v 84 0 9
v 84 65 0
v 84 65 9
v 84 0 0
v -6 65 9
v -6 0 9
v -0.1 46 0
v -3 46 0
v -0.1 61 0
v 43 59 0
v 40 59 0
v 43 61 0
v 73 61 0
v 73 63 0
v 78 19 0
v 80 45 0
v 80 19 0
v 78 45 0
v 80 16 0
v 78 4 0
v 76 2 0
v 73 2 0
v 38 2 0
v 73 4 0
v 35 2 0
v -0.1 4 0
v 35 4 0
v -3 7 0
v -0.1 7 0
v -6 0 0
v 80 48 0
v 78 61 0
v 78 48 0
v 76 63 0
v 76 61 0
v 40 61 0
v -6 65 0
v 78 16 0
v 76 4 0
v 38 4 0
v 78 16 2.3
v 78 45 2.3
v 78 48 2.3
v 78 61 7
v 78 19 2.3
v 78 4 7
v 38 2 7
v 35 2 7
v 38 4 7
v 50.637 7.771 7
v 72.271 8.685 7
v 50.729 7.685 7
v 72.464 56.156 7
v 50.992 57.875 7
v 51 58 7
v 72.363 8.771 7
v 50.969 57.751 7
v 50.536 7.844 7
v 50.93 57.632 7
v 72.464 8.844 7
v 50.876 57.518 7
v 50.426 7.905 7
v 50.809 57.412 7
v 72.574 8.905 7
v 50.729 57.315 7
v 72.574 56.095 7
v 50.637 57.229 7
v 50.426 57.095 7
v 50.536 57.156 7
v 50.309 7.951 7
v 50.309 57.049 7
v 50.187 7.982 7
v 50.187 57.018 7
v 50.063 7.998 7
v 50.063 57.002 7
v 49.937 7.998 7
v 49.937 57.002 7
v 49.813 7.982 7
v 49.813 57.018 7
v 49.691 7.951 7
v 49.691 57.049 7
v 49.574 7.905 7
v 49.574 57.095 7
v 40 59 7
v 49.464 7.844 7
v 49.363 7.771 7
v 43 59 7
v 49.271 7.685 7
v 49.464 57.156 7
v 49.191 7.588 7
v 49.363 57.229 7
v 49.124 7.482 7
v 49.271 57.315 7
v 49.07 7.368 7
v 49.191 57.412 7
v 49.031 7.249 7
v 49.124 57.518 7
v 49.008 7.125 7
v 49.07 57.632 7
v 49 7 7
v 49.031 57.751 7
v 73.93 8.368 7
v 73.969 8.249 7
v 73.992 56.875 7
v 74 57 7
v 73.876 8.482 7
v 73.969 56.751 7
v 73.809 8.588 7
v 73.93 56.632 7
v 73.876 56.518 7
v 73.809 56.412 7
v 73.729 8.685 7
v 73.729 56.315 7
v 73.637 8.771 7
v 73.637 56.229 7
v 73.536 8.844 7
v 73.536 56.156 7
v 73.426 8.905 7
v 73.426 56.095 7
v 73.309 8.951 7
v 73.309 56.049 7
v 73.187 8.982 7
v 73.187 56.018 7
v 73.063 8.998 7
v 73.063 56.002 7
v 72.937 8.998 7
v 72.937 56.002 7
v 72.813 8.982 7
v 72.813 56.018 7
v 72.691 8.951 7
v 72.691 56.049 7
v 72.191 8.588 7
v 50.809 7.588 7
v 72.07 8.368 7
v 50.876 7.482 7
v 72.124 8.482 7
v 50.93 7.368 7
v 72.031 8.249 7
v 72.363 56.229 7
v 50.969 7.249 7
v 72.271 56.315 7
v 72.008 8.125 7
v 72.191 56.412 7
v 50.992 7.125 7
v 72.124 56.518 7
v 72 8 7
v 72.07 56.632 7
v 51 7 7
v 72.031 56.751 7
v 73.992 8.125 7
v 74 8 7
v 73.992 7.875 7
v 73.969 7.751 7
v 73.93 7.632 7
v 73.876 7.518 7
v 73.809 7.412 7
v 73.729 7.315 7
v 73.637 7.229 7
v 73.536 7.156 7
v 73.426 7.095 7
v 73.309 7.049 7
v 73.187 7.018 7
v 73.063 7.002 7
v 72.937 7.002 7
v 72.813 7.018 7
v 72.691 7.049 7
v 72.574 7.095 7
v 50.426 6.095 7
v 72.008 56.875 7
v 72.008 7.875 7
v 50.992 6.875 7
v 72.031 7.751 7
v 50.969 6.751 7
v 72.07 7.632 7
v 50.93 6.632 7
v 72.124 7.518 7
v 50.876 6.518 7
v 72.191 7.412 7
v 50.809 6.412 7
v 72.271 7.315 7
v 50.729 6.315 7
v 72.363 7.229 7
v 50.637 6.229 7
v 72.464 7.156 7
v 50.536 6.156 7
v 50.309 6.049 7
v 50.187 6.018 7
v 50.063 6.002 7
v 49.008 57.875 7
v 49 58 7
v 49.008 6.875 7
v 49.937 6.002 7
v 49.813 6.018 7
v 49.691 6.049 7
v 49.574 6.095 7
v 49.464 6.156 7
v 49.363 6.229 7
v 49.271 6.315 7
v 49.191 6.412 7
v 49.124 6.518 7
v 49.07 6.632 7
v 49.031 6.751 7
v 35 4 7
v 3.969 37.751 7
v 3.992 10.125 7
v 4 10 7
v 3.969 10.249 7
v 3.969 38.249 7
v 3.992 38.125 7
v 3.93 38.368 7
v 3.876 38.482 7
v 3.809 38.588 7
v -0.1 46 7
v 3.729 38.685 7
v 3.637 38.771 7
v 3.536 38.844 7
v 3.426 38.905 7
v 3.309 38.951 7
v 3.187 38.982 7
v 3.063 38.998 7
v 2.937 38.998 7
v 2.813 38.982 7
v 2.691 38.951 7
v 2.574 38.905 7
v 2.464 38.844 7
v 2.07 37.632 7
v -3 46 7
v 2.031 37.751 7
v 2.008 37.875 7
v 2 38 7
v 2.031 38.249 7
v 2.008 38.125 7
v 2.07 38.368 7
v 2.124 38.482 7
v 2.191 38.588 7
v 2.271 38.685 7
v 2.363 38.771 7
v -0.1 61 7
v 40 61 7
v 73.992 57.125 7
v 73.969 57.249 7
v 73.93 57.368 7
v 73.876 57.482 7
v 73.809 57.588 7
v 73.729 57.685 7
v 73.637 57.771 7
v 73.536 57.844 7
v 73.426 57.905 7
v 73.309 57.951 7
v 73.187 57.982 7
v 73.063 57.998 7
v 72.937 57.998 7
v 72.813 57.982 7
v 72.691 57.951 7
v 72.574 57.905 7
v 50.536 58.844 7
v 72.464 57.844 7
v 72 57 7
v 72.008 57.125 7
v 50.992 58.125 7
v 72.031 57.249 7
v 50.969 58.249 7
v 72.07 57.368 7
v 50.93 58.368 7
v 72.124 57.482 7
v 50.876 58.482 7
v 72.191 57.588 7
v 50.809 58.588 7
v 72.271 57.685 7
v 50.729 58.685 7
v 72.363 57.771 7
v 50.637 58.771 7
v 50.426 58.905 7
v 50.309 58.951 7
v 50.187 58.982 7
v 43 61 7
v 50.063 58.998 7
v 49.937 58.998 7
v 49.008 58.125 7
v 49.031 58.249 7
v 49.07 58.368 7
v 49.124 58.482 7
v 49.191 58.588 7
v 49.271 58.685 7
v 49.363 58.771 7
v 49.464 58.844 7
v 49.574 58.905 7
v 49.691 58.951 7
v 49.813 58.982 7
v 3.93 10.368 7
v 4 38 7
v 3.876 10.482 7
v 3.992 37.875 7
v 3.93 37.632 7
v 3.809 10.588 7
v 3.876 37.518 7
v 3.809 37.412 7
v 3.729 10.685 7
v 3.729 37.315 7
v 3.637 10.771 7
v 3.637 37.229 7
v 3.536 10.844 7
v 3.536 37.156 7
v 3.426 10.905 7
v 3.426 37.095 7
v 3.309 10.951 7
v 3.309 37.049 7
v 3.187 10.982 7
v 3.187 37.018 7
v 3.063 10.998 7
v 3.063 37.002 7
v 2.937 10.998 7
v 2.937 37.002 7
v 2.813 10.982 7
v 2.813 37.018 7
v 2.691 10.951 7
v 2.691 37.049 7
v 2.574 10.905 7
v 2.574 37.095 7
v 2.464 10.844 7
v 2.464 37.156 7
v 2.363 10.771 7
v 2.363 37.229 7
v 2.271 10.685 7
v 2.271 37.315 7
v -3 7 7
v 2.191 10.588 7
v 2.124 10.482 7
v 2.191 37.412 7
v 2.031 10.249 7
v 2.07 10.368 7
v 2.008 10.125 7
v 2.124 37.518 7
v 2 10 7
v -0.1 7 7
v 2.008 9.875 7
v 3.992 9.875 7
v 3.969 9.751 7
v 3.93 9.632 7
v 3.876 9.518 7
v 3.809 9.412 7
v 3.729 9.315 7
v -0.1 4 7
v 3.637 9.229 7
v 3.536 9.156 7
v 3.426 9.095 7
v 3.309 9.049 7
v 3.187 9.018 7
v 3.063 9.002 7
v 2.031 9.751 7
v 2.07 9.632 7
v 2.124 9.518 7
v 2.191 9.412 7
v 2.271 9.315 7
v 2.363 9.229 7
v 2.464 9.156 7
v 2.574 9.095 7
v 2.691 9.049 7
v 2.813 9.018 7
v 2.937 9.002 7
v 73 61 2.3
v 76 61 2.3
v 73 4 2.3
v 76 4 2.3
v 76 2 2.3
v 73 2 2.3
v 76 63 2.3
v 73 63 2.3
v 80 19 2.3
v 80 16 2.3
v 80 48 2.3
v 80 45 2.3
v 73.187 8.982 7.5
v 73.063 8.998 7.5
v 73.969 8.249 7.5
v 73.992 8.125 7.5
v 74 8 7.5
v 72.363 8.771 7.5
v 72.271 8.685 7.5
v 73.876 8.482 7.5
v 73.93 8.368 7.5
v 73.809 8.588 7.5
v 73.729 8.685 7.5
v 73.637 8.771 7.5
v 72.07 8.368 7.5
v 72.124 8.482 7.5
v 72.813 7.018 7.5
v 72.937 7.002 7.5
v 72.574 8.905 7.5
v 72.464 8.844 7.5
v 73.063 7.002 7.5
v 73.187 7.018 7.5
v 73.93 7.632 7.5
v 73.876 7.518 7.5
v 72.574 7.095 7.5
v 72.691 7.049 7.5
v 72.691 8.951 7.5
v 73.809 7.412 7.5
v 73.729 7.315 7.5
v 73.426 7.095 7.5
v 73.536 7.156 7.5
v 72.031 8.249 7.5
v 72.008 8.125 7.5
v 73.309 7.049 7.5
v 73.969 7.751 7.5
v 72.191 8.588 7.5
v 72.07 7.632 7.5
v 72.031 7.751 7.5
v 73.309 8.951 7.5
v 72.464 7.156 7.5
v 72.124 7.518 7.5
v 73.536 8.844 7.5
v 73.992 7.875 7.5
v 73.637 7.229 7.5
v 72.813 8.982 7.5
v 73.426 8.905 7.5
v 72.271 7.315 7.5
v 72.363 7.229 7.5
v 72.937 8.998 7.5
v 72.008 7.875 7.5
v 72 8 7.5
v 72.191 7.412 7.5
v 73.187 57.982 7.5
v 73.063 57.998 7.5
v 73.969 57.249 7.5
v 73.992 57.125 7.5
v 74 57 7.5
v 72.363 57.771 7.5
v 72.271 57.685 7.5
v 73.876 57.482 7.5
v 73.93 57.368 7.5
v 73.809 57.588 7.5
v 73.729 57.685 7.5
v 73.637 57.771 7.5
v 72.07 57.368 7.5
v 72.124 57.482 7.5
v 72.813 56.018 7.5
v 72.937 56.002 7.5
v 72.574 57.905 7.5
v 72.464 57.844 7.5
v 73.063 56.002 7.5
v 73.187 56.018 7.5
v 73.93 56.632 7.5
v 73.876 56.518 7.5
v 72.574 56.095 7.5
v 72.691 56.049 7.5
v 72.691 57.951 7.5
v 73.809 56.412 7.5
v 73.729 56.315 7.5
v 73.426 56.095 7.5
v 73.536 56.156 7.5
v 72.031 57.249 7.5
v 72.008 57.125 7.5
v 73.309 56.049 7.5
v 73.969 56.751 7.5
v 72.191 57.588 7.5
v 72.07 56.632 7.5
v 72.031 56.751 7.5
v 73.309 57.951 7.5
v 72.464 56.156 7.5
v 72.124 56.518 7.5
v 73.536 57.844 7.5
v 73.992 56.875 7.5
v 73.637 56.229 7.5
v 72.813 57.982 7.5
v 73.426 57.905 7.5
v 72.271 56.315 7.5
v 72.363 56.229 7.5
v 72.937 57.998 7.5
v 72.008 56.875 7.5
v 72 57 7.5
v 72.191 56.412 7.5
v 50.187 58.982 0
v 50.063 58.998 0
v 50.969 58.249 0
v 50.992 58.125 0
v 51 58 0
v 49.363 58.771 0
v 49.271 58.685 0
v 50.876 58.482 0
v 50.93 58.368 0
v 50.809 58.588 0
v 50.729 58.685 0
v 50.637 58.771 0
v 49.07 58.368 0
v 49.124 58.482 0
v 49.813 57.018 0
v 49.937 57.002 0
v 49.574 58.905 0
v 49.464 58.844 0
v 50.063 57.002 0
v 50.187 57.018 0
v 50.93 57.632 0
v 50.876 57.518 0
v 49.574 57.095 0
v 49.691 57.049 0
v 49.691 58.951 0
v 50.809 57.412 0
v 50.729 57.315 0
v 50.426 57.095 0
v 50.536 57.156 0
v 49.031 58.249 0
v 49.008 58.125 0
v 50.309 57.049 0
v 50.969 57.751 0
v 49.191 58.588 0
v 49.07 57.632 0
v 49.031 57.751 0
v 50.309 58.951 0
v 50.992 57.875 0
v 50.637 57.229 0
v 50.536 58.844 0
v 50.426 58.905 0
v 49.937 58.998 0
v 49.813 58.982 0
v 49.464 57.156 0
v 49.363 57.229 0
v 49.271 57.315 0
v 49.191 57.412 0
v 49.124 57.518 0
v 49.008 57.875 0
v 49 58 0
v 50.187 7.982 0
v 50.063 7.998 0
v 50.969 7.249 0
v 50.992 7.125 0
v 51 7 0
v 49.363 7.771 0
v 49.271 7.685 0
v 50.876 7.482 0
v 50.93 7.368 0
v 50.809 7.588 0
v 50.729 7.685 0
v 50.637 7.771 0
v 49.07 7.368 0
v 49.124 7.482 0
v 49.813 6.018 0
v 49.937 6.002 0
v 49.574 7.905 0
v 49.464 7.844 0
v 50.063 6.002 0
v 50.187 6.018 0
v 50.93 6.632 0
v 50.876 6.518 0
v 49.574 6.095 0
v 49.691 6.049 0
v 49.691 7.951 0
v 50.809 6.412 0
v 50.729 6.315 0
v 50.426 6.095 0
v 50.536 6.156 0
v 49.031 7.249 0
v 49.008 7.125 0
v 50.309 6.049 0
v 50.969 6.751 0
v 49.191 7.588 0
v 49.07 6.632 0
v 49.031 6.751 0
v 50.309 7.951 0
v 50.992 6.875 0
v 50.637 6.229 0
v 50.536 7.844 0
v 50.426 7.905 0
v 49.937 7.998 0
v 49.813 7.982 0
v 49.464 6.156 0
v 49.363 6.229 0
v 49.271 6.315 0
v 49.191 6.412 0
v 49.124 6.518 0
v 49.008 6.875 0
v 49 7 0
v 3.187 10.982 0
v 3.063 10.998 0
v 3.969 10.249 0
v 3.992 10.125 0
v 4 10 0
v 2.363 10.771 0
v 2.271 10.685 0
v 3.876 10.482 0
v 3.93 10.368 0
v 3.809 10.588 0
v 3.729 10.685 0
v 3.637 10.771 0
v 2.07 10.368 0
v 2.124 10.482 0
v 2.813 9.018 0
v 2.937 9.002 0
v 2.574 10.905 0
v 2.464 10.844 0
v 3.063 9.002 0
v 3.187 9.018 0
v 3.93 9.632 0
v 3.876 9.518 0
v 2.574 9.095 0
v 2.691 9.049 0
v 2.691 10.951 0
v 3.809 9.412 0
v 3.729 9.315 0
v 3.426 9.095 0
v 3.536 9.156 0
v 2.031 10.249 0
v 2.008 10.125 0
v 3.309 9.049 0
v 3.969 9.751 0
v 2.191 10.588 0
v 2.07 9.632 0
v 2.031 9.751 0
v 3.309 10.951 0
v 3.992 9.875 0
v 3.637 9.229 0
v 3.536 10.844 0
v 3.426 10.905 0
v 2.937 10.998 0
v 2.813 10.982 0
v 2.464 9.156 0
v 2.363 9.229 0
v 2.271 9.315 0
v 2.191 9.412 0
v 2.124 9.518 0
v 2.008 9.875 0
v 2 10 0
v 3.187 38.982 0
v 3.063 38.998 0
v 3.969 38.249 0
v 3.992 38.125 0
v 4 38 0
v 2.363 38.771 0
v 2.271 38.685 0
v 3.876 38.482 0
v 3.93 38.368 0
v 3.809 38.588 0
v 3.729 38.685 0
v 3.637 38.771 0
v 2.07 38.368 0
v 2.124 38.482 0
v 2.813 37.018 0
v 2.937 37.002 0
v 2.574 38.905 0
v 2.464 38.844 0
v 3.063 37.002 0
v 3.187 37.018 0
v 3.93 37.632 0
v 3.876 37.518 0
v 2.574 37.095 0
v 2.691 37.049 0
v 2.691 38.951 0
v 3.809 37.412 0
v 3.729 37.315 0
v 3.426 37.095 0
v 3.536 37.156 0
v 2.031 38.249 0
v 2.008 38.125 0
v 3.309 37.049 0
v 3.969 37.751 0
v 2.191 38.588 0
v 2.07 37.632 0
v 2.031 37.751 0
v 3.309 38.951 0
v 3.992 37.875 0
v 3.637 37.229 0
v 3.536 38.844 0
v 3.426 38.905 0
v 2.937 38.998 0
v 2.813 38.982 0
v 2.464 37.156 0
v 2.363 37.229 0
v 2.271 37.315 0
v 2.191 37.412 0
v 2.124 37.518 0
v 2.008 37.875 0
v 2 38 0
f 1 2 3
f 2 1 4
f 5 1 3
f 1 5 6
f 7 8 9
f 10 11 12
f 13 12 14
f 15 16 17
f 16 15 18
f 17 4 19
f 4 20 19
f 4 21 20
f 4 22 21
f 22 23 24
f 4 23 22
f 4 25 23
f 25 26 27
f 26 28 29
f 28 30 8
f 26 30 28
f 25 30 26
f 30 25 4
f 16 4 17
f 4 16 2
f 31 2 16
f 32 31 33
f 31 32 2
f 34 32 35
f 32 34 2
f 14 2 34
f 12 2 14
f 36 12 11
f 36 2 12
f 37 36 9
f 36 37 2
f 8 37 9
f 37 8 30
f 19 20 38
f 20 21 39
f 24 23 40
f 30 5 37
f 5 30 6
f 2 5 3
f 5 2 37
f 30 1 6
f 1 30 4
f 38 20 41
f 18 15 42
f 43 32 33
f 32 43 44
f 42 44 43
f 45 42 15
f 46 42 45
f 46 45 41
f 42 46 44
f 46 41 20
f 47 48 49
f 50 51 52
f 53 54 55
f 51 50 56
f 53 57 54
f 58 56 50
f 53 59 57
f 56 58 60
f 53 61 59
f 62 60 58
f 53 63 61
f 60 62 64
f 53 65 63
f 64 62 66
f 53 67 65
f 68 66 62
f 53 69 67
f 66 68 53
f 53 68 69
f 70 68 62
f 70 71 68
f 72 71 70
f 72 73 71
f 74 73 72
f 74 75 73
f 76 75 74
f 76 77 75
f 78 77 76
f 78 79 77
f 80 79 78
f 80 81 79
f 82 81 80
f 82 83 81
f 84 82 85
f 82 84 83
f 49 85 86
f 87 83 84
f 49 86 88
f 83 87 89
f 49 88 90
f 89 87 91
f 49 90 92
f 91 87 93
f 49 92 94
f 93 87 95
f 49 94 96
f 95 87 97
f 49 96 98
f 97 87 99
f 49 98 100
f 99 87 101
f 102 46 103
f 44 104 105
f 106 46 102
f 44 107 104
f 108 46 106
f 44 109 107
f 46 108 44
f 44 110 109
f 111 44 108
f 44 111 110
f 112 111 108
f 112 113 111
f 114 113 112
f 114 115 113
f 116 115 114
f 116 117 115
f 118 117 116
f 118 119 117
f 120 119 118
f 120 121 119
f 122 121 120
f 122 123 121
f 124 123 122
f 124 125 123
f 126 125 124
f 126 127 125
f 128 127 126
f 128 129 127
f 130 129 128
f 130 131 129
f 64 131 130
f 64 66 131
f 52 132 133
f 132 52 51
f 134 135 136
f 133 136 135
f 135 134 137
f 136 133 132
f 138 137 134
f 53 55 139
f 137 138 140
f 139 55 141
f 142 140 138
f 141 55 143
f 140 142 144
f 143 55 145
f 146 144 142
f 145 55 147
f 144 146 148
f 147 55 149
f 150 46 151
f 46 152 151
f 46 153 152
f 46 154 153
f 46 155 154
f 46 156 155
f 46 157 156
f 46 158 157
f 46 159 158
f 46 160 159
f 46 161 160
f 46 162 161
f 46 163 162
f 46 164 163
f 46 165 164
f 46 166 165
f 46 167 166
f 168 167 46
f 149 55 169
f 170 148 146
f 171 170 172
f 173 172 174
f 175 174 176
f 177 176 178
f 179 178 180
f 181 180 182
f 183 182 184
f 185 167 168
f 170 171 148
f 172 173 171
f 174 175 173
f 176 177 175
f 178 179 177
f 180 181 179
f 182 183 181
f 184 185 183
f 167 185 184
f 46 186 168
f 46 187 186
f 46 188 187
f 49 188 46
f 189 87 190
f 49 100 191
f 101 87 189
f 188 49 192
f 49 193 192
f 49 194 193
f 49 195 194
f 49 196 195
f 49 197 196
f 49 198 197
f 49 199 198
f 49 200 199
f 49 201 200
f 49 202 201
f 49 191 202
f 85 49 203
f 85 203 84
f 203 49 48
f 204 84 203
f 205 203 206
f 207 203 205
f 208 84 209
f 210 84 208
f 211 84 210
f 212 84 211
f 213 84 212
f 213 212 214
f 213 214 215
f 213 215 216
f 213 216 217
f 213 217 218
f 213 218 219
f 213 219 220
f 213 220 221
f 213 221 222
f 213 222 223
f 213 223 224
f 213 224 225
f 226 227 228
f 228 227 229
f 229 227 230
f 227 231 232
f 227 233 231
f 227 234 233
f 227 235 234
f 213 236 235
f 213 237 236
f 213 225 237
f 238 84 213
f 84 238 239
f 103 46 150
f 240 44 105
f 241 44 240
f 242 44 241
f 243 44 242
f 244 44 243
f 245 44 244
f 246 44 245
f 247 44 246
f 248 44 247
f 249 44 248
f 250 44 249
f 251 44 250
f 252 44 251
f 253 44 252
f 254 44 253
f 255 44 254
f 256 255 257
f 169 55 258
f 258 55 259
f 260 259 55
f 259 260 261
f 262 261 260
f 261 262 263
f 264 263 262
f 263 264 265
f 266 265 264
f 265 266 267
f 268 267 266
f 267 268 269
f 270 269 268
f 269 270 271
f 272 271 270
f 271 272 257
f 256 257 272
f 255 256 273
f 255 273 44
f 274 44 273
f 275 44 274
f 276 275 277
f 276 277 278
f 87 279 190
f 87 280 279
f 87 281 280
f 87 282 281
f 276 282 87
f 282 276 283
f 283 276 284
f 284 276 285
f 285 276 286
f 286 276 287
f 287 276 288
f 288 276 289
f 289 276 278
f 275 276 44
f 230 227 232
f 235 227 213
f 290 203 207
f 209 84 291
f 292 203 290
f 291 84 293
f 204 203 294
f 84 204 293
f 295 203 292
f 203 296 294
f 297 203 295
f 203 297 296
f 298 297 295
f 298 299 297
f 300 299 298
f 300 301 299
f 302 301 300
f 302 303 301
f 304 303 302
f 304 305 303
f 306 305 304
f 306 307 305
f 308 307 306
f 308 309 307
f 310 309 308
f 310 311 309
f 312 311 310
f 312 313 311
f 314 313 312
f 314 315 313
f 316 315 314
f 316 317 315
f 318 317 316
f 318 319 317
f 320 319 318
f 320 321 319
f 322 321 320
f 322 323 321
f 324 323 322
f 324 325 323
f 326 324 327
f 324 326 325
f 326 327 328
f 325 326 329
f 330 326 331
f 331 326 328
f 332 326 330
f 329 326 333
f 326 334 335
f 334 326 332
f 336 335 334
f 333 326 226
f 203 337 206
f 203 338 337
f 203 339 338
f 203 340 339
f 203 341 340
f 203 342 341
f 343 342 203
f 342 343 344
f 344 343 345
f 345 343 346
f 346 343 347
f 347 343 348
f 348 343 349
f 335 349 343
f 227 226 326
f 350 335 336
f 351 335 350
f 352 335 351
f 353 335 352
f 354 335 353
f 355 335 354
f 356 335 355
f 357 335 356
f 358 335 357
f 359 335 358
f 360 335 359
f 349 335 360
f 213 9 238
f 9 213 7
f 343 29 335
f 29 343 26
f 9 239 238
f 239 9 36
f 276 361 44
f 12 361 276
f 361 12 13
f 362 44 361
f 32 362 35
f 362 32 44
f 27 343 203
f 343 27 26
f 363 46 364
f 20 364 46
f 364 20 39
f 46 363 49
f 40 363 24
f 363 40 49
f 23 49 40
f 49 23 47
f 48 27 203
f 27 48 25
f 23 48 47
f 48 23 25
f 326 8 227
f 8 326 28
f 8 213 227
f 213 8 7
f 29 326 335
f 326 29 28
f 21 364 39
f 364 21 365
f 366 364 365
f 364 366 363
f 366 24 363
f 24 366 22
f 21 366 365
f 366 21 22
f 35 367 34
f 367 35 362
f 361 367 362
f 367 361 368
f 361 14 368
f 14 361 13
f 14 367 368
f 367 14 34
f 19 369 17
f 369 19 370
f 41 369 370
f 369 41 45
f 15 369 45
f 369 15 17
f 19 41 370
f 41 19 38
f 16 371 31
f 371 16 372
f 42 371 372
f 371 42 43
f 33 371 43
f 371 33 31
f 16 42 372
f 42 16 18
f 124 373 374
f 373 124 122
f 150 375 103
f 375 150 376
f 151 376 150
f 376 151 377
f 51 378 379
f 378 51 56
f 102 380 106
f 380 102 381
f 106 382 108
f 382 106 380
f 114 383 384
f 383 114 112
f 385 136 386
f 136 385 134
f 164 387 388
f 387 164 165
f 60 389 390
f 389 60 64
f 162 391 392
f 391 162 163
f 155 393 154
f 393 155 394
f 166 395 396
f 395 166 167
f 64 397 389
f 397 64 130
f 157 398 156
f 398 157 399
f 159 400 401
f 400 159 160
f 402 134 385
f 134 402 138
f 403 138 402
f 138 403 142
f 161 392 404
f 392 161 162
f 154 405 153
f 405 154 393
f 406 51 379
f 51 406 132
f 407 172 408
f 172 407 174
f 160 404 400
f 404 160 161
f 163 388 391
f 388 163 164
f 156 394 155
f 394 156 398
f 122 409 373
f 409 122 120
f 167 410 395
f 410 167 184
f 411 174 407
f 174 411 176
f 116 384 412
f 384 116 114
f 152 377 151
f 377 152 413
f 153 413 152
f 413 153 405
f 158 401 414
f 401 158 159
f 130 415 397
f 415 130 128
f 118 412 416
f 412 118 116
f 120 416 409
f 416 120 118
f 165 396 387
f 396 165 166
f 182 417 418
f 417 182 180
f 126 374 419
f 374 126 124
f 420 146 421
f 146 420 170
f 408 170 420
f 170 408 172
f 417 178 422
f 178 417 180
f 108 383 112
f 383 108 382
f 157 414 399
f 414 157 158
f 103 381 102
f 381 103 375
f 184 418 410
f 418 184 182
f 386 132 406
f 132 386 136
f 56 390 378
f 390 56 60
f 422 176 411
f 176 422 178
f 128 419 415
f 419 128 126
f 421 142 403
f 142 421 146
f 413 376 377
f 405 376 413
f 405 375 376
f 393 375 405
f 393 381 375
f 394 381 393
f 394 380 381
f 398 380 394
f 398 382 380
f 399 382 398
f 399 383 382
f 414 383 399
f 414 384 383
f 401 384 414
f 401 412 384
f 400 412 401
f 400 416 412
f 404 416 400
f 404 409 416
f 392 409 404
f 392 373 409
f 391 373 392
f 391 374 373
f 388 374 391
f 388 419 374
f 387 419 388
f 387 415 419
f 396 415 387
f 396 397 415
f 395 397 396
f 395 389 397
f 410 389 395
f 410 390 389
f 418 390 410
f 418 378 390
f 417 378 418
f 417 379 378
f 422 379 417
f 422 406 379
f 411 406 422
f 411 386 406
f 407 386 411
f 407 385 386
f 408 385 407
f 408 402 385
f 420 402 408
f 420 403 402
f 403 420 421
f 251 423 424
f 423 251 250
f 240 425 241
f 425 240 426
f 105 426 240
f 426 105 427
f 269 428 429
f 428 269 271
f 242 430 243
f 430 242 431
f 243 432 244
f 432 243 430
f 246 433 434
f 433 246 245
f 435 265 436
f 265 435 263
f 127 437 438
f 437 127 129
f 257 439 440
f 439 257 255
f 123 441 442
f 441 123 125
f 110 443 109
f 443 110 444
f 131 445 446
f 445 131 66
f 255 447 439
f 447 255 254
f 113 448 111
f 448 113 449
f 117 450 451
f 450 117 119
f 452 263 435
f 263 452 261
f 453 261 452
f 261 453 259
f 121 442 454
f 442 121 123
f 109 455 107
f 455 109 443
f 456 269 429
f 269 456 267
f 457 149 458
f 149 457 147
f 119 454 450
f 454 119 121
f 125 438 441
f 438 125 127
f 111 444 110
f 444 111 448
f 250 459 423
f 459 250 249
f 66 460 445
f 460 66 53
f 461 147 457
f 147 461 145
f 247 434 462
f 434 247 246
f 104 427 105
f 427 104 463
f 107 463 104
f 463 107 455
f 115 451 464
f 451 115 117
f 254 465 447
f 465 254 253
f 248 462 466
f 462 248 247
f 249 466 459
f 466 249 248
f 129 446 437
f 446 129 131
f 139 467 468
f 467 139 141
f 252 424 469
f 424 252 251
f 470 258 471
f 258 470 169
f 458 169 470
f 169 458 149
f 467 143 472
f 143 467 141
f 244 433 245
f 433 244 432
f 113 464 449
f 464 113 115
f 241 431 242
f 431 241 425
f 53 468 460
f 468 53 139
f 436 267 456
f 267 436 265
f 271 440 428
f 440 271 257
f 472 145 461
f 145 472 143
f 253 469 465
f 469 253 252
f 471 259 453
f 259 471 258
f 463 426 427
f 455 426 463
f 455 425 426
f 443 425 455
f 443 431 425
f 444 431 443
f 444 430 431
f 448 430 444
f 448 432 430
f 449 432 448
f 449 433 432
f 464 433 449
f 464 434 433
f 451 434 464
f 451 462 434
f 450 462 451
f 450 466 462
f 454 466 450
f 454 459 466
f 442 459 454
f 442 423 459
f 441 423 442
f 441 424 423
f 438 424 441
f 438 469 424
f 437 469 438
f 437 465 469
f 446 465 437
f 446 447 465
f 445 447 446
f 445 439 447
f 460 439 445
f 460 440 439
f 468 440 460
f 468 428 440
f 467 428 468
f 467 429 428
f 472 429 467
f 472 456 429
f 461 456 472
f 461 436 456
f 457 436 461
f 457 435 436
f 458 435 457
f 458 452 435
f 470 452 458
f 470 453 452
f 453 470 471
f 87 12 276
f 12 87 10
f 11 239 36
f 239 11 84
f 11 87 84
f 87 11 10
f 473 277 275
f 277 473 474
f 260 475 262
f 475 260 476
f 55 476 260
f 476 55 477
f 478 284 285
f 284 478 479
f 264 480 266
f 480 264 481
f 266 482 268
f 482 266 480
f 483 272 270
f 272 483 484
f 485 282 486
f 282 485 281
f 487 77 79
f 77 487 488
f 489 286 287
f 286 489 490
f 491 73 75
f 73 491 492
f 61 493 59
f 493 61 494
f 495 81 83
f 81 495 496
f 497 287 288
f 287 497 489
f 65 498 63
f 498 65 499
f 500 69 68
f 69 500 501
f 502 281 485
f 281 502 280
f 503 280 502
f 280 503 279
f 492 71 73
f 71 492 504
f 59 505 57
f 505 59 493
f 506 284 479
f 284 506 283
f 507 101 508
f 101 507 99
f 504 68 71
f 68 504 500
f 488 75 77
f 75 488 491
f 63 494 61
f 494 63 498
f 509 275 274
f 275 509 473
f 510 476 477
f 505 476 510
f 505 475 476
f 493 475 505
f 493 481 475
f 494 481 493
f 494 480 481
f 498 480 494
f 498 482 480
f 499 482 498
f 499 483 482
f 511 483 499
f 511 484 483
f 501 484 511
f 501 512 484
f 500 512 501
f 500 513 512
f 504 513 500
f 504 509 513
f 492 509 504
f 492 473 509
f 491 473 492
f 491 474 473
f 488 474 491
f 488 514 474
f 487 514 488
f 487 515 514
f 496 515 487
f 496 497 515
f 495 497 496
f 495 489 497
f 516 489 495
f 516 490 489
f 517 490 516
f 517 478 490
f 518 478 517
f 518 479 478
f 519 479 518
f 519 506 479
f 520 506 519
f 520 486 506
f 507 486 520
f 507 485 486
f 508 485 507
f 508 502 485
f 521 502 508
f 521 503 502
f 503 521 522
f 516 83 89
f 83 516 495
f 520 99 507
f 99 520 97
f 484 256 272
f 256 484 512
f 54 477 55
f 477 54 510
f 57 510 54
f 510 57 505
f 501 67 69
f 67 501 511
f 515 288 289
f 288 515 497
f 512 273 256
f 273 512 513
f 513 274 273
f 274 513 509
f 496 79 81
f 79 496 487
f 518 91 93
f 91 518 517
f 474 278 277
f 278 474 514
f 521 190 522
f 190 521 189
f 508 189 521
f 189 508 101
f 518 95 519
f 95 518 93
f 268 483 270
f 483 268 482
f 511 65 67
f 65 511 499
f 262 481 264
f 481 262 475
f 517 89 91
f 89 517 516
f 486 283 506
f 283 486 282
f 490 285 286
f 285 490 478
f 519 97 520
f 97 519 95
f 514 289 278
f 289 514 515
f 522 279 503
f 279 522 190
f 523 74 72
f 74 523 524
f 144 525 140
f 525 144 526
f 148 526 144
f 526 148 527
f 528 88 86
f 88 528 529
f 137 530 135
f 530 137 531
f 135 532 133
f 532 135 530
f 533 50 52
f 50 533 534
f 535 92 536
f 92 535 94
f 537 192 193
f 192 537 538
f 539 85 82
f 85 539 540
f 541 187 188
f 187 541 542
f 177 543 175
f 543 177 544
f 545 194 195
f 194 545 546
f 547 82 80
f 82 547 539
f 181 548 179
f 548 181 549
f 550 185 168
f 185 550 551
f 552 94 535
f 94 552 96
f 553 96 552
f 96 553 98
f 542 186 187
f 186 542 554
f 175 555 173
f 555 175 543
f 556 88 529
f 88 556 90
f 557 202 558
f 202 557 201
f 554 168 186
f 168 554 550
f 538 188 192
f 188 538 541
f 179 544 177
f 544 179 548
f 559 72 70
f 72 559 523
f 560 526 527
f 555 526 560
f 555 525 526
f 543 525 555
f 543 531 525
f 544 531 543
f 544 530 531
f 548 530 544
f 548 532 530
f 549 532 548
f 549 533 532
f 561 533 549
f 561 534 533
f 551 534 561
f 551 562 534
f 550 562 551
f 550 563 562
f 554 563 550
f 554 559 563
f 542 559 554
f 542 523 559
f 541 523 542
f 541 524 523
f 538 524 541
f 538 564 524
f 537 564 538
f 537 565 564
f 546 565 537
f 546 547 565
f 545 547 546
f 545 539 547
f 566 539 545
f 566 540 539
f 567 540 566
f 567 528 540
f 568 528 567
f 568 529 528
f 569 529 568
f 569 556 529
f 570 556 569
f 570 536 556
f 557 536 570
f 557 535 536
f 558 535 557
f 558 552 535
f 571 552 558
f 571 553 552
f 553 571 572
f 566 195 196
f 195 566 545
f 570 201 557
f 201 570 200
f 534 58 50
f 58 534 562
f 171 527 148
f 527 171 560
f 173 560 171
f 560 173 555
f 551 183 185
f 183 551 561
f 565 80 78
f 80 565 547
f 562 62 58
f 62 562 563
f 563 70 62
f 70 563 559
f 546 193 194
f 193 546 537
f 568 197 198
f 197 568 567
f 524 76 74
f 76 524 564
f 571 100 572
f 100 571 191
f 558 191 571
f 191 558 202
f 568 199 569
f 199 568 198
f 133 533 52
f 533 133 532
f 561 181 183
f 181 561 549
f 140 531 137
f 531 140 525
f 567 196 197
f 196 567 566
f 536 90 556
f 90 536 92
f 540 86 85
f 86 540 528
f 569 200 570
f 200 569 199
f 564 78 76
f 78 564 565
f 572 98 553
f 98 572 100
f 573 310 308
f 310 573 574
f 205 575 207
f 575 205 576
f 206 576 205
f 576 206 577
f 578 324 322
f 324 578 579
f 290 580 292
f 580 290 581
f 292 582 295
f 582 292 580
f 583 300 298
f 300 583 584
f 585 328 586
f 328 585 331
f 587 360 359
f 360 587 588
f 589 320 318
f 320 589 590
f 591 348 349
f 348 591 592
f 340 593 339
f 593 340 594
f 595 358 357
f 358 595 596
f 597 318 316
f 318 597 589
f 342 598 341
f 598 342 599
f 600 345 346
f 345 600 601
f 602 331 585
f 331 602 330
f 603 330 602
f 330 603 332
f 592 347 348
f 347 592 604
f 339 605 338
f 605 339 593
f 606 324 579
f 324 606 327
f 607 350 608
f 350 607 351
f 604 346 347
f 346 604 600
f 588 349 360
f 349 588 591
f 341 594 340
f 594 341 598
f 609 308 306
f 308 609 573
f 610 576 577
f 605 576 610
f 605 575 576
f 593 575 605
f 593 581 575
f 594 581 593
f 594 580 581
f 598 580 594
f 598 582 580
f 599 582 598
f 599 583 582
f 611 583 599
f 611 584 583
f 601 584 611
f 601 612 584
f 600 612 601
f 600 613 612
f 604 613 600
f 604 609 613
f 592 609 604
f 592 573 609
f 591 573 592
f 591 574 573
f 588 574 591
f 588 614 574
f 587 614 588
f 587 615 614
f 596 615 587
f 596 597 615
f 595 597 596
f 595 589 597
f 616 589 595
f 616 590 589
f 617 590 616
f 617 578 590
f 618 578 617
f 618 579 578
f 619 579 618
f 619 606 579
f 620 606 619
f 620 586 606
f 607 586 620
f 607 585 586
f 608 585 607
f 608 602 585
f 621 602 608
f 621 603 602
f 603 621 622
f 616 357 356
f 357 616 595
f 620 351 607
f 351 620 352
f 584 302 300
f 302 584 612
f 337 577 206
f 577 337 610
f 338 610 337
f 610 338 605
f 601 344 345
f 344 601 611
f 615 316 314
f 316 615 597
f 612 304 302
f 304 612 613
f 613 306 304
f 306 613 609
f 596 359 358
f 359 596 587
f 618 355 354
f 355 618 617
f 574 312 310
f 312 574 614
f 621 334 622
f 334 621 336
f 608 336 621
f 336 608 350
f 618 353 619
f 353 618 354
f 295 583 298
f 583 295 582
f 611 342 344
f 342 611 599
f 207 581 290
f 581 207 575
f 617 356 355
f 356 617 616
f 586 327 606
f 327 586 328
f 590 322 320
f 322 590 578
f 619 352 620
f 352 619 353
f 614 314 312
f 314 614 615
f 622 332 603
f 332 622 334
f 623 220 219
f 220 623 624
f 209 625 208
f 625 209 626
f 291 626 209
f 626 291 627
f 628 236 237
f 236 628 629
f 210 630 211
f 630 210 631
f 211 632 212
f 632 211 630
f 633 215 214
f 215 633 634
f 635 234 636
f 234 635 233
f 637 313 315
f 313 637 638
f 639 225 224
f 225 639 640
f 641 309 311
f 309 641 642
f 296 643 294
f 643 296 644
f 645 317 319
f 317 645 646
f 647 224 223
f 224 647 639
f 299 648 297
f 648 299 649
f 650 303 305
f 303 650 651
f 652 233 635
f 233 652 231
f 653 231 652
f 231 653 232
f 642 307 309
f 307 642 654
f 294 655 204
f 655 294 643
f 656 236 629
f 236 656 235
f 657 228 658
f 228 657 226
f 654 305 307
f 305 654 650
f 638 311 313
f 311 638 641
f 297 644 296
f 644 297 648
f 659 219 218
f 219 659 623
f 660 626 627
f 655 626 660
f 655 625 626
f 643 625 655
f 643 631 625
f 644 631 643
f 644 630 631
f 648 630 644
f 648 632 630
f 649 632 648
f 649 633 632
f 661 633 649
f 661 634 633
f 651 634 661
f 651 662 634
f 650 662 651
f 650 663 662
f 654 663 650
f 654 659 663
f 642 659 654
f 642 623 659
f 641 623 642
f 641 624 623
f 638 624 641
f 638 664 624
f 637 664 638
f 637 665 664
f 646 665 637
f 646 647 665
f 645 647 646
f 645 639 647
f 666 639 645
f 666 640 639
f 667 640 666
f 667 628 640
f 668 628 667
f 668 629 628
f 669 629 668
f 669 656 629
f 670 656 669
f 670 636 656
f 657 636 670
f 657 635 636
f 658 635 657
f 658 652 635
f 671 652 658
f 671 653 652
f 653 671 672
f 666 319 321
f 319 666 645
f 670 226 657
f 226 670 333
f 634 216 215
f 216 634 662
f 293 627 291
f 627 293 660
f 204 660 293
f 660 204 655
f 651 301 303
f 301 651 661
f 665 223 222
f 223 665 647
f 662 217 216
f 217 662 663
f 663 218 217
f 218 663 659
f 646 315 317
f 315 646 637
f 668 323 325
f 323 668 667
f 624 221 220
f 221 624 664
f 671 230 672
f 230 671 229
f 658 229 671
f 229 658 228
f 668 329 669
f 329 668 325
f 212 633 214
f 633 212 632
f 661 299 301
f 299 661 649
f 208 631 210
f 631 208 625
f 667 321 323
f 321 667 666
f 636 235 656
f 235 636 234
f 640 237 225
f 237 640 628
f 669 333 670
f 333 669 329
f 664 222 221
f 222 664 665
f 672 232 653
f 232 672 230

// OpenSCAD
$fn=50;

X_CASE=90;
Y_CASE=65;
Z_CASE=9;
X_ARD=78;
Y_ARD=57;
Z_ARD=7;

module ArdCylinder(){
    //cylinders that fit into holes in Arduino board
    cylinder(Z_ARD,1,1);
}

module CylinderHole(){
    //used to create holes for cylinders on part2 to fit in
    cylinder(Z_ARD+0.5,1,1);
}

difference(){
    translate([-6,0,0]){
        cube([X_CASE,Y_CASE,Z_CASE]);
    }
    //create space for Arduino main body
    translate([-0.1,(Y_CASE-Y_ARD)/2,-0.1]){
        cube([X_ARD+0.1,Y_ARD,Z_ARD+0.1]);
    }
    translate([35,2,-0.1]){
        cube([3,2.1,Z_ARD+0.1]);
    }
    translate([-3,7,-0.1]){
        cube([3,39,Z_ARD+0.1]);
    }
    //create space for part2
    translate([73,2,-0.1]){
    cube([3,2.1,2.4]);
    }
    translate([73,60.9,-0.1]){
    cube([3,2.1,2.4]);
    }
    translate([77.9,16,-0.1]){
    cube([2.1,3,2.4]);
    }
    translate([77.9,45,-0.1]){
    cube([2.1,3,2.4]);
    }
    translate([73,8,0]){
    CylinderHole();
    }
    translate([73,Y_CASE-8,0]){
    CylinderHole();
    }
}

//add cylinders and blocks to fit holes in Arduino
translate([40,2+Y_ARD,0]){
    cube([3,2,Z_ARD]);
}
translate([50,Y_CASE-7,0]){
    ArdCylinder();
}
translate([50,7,0]){
    ArdCylinder();
}
translate([3,10,0]){
    ArdCylinder();
}
translate([3,38,0]){
    ArdCylinder();
}
